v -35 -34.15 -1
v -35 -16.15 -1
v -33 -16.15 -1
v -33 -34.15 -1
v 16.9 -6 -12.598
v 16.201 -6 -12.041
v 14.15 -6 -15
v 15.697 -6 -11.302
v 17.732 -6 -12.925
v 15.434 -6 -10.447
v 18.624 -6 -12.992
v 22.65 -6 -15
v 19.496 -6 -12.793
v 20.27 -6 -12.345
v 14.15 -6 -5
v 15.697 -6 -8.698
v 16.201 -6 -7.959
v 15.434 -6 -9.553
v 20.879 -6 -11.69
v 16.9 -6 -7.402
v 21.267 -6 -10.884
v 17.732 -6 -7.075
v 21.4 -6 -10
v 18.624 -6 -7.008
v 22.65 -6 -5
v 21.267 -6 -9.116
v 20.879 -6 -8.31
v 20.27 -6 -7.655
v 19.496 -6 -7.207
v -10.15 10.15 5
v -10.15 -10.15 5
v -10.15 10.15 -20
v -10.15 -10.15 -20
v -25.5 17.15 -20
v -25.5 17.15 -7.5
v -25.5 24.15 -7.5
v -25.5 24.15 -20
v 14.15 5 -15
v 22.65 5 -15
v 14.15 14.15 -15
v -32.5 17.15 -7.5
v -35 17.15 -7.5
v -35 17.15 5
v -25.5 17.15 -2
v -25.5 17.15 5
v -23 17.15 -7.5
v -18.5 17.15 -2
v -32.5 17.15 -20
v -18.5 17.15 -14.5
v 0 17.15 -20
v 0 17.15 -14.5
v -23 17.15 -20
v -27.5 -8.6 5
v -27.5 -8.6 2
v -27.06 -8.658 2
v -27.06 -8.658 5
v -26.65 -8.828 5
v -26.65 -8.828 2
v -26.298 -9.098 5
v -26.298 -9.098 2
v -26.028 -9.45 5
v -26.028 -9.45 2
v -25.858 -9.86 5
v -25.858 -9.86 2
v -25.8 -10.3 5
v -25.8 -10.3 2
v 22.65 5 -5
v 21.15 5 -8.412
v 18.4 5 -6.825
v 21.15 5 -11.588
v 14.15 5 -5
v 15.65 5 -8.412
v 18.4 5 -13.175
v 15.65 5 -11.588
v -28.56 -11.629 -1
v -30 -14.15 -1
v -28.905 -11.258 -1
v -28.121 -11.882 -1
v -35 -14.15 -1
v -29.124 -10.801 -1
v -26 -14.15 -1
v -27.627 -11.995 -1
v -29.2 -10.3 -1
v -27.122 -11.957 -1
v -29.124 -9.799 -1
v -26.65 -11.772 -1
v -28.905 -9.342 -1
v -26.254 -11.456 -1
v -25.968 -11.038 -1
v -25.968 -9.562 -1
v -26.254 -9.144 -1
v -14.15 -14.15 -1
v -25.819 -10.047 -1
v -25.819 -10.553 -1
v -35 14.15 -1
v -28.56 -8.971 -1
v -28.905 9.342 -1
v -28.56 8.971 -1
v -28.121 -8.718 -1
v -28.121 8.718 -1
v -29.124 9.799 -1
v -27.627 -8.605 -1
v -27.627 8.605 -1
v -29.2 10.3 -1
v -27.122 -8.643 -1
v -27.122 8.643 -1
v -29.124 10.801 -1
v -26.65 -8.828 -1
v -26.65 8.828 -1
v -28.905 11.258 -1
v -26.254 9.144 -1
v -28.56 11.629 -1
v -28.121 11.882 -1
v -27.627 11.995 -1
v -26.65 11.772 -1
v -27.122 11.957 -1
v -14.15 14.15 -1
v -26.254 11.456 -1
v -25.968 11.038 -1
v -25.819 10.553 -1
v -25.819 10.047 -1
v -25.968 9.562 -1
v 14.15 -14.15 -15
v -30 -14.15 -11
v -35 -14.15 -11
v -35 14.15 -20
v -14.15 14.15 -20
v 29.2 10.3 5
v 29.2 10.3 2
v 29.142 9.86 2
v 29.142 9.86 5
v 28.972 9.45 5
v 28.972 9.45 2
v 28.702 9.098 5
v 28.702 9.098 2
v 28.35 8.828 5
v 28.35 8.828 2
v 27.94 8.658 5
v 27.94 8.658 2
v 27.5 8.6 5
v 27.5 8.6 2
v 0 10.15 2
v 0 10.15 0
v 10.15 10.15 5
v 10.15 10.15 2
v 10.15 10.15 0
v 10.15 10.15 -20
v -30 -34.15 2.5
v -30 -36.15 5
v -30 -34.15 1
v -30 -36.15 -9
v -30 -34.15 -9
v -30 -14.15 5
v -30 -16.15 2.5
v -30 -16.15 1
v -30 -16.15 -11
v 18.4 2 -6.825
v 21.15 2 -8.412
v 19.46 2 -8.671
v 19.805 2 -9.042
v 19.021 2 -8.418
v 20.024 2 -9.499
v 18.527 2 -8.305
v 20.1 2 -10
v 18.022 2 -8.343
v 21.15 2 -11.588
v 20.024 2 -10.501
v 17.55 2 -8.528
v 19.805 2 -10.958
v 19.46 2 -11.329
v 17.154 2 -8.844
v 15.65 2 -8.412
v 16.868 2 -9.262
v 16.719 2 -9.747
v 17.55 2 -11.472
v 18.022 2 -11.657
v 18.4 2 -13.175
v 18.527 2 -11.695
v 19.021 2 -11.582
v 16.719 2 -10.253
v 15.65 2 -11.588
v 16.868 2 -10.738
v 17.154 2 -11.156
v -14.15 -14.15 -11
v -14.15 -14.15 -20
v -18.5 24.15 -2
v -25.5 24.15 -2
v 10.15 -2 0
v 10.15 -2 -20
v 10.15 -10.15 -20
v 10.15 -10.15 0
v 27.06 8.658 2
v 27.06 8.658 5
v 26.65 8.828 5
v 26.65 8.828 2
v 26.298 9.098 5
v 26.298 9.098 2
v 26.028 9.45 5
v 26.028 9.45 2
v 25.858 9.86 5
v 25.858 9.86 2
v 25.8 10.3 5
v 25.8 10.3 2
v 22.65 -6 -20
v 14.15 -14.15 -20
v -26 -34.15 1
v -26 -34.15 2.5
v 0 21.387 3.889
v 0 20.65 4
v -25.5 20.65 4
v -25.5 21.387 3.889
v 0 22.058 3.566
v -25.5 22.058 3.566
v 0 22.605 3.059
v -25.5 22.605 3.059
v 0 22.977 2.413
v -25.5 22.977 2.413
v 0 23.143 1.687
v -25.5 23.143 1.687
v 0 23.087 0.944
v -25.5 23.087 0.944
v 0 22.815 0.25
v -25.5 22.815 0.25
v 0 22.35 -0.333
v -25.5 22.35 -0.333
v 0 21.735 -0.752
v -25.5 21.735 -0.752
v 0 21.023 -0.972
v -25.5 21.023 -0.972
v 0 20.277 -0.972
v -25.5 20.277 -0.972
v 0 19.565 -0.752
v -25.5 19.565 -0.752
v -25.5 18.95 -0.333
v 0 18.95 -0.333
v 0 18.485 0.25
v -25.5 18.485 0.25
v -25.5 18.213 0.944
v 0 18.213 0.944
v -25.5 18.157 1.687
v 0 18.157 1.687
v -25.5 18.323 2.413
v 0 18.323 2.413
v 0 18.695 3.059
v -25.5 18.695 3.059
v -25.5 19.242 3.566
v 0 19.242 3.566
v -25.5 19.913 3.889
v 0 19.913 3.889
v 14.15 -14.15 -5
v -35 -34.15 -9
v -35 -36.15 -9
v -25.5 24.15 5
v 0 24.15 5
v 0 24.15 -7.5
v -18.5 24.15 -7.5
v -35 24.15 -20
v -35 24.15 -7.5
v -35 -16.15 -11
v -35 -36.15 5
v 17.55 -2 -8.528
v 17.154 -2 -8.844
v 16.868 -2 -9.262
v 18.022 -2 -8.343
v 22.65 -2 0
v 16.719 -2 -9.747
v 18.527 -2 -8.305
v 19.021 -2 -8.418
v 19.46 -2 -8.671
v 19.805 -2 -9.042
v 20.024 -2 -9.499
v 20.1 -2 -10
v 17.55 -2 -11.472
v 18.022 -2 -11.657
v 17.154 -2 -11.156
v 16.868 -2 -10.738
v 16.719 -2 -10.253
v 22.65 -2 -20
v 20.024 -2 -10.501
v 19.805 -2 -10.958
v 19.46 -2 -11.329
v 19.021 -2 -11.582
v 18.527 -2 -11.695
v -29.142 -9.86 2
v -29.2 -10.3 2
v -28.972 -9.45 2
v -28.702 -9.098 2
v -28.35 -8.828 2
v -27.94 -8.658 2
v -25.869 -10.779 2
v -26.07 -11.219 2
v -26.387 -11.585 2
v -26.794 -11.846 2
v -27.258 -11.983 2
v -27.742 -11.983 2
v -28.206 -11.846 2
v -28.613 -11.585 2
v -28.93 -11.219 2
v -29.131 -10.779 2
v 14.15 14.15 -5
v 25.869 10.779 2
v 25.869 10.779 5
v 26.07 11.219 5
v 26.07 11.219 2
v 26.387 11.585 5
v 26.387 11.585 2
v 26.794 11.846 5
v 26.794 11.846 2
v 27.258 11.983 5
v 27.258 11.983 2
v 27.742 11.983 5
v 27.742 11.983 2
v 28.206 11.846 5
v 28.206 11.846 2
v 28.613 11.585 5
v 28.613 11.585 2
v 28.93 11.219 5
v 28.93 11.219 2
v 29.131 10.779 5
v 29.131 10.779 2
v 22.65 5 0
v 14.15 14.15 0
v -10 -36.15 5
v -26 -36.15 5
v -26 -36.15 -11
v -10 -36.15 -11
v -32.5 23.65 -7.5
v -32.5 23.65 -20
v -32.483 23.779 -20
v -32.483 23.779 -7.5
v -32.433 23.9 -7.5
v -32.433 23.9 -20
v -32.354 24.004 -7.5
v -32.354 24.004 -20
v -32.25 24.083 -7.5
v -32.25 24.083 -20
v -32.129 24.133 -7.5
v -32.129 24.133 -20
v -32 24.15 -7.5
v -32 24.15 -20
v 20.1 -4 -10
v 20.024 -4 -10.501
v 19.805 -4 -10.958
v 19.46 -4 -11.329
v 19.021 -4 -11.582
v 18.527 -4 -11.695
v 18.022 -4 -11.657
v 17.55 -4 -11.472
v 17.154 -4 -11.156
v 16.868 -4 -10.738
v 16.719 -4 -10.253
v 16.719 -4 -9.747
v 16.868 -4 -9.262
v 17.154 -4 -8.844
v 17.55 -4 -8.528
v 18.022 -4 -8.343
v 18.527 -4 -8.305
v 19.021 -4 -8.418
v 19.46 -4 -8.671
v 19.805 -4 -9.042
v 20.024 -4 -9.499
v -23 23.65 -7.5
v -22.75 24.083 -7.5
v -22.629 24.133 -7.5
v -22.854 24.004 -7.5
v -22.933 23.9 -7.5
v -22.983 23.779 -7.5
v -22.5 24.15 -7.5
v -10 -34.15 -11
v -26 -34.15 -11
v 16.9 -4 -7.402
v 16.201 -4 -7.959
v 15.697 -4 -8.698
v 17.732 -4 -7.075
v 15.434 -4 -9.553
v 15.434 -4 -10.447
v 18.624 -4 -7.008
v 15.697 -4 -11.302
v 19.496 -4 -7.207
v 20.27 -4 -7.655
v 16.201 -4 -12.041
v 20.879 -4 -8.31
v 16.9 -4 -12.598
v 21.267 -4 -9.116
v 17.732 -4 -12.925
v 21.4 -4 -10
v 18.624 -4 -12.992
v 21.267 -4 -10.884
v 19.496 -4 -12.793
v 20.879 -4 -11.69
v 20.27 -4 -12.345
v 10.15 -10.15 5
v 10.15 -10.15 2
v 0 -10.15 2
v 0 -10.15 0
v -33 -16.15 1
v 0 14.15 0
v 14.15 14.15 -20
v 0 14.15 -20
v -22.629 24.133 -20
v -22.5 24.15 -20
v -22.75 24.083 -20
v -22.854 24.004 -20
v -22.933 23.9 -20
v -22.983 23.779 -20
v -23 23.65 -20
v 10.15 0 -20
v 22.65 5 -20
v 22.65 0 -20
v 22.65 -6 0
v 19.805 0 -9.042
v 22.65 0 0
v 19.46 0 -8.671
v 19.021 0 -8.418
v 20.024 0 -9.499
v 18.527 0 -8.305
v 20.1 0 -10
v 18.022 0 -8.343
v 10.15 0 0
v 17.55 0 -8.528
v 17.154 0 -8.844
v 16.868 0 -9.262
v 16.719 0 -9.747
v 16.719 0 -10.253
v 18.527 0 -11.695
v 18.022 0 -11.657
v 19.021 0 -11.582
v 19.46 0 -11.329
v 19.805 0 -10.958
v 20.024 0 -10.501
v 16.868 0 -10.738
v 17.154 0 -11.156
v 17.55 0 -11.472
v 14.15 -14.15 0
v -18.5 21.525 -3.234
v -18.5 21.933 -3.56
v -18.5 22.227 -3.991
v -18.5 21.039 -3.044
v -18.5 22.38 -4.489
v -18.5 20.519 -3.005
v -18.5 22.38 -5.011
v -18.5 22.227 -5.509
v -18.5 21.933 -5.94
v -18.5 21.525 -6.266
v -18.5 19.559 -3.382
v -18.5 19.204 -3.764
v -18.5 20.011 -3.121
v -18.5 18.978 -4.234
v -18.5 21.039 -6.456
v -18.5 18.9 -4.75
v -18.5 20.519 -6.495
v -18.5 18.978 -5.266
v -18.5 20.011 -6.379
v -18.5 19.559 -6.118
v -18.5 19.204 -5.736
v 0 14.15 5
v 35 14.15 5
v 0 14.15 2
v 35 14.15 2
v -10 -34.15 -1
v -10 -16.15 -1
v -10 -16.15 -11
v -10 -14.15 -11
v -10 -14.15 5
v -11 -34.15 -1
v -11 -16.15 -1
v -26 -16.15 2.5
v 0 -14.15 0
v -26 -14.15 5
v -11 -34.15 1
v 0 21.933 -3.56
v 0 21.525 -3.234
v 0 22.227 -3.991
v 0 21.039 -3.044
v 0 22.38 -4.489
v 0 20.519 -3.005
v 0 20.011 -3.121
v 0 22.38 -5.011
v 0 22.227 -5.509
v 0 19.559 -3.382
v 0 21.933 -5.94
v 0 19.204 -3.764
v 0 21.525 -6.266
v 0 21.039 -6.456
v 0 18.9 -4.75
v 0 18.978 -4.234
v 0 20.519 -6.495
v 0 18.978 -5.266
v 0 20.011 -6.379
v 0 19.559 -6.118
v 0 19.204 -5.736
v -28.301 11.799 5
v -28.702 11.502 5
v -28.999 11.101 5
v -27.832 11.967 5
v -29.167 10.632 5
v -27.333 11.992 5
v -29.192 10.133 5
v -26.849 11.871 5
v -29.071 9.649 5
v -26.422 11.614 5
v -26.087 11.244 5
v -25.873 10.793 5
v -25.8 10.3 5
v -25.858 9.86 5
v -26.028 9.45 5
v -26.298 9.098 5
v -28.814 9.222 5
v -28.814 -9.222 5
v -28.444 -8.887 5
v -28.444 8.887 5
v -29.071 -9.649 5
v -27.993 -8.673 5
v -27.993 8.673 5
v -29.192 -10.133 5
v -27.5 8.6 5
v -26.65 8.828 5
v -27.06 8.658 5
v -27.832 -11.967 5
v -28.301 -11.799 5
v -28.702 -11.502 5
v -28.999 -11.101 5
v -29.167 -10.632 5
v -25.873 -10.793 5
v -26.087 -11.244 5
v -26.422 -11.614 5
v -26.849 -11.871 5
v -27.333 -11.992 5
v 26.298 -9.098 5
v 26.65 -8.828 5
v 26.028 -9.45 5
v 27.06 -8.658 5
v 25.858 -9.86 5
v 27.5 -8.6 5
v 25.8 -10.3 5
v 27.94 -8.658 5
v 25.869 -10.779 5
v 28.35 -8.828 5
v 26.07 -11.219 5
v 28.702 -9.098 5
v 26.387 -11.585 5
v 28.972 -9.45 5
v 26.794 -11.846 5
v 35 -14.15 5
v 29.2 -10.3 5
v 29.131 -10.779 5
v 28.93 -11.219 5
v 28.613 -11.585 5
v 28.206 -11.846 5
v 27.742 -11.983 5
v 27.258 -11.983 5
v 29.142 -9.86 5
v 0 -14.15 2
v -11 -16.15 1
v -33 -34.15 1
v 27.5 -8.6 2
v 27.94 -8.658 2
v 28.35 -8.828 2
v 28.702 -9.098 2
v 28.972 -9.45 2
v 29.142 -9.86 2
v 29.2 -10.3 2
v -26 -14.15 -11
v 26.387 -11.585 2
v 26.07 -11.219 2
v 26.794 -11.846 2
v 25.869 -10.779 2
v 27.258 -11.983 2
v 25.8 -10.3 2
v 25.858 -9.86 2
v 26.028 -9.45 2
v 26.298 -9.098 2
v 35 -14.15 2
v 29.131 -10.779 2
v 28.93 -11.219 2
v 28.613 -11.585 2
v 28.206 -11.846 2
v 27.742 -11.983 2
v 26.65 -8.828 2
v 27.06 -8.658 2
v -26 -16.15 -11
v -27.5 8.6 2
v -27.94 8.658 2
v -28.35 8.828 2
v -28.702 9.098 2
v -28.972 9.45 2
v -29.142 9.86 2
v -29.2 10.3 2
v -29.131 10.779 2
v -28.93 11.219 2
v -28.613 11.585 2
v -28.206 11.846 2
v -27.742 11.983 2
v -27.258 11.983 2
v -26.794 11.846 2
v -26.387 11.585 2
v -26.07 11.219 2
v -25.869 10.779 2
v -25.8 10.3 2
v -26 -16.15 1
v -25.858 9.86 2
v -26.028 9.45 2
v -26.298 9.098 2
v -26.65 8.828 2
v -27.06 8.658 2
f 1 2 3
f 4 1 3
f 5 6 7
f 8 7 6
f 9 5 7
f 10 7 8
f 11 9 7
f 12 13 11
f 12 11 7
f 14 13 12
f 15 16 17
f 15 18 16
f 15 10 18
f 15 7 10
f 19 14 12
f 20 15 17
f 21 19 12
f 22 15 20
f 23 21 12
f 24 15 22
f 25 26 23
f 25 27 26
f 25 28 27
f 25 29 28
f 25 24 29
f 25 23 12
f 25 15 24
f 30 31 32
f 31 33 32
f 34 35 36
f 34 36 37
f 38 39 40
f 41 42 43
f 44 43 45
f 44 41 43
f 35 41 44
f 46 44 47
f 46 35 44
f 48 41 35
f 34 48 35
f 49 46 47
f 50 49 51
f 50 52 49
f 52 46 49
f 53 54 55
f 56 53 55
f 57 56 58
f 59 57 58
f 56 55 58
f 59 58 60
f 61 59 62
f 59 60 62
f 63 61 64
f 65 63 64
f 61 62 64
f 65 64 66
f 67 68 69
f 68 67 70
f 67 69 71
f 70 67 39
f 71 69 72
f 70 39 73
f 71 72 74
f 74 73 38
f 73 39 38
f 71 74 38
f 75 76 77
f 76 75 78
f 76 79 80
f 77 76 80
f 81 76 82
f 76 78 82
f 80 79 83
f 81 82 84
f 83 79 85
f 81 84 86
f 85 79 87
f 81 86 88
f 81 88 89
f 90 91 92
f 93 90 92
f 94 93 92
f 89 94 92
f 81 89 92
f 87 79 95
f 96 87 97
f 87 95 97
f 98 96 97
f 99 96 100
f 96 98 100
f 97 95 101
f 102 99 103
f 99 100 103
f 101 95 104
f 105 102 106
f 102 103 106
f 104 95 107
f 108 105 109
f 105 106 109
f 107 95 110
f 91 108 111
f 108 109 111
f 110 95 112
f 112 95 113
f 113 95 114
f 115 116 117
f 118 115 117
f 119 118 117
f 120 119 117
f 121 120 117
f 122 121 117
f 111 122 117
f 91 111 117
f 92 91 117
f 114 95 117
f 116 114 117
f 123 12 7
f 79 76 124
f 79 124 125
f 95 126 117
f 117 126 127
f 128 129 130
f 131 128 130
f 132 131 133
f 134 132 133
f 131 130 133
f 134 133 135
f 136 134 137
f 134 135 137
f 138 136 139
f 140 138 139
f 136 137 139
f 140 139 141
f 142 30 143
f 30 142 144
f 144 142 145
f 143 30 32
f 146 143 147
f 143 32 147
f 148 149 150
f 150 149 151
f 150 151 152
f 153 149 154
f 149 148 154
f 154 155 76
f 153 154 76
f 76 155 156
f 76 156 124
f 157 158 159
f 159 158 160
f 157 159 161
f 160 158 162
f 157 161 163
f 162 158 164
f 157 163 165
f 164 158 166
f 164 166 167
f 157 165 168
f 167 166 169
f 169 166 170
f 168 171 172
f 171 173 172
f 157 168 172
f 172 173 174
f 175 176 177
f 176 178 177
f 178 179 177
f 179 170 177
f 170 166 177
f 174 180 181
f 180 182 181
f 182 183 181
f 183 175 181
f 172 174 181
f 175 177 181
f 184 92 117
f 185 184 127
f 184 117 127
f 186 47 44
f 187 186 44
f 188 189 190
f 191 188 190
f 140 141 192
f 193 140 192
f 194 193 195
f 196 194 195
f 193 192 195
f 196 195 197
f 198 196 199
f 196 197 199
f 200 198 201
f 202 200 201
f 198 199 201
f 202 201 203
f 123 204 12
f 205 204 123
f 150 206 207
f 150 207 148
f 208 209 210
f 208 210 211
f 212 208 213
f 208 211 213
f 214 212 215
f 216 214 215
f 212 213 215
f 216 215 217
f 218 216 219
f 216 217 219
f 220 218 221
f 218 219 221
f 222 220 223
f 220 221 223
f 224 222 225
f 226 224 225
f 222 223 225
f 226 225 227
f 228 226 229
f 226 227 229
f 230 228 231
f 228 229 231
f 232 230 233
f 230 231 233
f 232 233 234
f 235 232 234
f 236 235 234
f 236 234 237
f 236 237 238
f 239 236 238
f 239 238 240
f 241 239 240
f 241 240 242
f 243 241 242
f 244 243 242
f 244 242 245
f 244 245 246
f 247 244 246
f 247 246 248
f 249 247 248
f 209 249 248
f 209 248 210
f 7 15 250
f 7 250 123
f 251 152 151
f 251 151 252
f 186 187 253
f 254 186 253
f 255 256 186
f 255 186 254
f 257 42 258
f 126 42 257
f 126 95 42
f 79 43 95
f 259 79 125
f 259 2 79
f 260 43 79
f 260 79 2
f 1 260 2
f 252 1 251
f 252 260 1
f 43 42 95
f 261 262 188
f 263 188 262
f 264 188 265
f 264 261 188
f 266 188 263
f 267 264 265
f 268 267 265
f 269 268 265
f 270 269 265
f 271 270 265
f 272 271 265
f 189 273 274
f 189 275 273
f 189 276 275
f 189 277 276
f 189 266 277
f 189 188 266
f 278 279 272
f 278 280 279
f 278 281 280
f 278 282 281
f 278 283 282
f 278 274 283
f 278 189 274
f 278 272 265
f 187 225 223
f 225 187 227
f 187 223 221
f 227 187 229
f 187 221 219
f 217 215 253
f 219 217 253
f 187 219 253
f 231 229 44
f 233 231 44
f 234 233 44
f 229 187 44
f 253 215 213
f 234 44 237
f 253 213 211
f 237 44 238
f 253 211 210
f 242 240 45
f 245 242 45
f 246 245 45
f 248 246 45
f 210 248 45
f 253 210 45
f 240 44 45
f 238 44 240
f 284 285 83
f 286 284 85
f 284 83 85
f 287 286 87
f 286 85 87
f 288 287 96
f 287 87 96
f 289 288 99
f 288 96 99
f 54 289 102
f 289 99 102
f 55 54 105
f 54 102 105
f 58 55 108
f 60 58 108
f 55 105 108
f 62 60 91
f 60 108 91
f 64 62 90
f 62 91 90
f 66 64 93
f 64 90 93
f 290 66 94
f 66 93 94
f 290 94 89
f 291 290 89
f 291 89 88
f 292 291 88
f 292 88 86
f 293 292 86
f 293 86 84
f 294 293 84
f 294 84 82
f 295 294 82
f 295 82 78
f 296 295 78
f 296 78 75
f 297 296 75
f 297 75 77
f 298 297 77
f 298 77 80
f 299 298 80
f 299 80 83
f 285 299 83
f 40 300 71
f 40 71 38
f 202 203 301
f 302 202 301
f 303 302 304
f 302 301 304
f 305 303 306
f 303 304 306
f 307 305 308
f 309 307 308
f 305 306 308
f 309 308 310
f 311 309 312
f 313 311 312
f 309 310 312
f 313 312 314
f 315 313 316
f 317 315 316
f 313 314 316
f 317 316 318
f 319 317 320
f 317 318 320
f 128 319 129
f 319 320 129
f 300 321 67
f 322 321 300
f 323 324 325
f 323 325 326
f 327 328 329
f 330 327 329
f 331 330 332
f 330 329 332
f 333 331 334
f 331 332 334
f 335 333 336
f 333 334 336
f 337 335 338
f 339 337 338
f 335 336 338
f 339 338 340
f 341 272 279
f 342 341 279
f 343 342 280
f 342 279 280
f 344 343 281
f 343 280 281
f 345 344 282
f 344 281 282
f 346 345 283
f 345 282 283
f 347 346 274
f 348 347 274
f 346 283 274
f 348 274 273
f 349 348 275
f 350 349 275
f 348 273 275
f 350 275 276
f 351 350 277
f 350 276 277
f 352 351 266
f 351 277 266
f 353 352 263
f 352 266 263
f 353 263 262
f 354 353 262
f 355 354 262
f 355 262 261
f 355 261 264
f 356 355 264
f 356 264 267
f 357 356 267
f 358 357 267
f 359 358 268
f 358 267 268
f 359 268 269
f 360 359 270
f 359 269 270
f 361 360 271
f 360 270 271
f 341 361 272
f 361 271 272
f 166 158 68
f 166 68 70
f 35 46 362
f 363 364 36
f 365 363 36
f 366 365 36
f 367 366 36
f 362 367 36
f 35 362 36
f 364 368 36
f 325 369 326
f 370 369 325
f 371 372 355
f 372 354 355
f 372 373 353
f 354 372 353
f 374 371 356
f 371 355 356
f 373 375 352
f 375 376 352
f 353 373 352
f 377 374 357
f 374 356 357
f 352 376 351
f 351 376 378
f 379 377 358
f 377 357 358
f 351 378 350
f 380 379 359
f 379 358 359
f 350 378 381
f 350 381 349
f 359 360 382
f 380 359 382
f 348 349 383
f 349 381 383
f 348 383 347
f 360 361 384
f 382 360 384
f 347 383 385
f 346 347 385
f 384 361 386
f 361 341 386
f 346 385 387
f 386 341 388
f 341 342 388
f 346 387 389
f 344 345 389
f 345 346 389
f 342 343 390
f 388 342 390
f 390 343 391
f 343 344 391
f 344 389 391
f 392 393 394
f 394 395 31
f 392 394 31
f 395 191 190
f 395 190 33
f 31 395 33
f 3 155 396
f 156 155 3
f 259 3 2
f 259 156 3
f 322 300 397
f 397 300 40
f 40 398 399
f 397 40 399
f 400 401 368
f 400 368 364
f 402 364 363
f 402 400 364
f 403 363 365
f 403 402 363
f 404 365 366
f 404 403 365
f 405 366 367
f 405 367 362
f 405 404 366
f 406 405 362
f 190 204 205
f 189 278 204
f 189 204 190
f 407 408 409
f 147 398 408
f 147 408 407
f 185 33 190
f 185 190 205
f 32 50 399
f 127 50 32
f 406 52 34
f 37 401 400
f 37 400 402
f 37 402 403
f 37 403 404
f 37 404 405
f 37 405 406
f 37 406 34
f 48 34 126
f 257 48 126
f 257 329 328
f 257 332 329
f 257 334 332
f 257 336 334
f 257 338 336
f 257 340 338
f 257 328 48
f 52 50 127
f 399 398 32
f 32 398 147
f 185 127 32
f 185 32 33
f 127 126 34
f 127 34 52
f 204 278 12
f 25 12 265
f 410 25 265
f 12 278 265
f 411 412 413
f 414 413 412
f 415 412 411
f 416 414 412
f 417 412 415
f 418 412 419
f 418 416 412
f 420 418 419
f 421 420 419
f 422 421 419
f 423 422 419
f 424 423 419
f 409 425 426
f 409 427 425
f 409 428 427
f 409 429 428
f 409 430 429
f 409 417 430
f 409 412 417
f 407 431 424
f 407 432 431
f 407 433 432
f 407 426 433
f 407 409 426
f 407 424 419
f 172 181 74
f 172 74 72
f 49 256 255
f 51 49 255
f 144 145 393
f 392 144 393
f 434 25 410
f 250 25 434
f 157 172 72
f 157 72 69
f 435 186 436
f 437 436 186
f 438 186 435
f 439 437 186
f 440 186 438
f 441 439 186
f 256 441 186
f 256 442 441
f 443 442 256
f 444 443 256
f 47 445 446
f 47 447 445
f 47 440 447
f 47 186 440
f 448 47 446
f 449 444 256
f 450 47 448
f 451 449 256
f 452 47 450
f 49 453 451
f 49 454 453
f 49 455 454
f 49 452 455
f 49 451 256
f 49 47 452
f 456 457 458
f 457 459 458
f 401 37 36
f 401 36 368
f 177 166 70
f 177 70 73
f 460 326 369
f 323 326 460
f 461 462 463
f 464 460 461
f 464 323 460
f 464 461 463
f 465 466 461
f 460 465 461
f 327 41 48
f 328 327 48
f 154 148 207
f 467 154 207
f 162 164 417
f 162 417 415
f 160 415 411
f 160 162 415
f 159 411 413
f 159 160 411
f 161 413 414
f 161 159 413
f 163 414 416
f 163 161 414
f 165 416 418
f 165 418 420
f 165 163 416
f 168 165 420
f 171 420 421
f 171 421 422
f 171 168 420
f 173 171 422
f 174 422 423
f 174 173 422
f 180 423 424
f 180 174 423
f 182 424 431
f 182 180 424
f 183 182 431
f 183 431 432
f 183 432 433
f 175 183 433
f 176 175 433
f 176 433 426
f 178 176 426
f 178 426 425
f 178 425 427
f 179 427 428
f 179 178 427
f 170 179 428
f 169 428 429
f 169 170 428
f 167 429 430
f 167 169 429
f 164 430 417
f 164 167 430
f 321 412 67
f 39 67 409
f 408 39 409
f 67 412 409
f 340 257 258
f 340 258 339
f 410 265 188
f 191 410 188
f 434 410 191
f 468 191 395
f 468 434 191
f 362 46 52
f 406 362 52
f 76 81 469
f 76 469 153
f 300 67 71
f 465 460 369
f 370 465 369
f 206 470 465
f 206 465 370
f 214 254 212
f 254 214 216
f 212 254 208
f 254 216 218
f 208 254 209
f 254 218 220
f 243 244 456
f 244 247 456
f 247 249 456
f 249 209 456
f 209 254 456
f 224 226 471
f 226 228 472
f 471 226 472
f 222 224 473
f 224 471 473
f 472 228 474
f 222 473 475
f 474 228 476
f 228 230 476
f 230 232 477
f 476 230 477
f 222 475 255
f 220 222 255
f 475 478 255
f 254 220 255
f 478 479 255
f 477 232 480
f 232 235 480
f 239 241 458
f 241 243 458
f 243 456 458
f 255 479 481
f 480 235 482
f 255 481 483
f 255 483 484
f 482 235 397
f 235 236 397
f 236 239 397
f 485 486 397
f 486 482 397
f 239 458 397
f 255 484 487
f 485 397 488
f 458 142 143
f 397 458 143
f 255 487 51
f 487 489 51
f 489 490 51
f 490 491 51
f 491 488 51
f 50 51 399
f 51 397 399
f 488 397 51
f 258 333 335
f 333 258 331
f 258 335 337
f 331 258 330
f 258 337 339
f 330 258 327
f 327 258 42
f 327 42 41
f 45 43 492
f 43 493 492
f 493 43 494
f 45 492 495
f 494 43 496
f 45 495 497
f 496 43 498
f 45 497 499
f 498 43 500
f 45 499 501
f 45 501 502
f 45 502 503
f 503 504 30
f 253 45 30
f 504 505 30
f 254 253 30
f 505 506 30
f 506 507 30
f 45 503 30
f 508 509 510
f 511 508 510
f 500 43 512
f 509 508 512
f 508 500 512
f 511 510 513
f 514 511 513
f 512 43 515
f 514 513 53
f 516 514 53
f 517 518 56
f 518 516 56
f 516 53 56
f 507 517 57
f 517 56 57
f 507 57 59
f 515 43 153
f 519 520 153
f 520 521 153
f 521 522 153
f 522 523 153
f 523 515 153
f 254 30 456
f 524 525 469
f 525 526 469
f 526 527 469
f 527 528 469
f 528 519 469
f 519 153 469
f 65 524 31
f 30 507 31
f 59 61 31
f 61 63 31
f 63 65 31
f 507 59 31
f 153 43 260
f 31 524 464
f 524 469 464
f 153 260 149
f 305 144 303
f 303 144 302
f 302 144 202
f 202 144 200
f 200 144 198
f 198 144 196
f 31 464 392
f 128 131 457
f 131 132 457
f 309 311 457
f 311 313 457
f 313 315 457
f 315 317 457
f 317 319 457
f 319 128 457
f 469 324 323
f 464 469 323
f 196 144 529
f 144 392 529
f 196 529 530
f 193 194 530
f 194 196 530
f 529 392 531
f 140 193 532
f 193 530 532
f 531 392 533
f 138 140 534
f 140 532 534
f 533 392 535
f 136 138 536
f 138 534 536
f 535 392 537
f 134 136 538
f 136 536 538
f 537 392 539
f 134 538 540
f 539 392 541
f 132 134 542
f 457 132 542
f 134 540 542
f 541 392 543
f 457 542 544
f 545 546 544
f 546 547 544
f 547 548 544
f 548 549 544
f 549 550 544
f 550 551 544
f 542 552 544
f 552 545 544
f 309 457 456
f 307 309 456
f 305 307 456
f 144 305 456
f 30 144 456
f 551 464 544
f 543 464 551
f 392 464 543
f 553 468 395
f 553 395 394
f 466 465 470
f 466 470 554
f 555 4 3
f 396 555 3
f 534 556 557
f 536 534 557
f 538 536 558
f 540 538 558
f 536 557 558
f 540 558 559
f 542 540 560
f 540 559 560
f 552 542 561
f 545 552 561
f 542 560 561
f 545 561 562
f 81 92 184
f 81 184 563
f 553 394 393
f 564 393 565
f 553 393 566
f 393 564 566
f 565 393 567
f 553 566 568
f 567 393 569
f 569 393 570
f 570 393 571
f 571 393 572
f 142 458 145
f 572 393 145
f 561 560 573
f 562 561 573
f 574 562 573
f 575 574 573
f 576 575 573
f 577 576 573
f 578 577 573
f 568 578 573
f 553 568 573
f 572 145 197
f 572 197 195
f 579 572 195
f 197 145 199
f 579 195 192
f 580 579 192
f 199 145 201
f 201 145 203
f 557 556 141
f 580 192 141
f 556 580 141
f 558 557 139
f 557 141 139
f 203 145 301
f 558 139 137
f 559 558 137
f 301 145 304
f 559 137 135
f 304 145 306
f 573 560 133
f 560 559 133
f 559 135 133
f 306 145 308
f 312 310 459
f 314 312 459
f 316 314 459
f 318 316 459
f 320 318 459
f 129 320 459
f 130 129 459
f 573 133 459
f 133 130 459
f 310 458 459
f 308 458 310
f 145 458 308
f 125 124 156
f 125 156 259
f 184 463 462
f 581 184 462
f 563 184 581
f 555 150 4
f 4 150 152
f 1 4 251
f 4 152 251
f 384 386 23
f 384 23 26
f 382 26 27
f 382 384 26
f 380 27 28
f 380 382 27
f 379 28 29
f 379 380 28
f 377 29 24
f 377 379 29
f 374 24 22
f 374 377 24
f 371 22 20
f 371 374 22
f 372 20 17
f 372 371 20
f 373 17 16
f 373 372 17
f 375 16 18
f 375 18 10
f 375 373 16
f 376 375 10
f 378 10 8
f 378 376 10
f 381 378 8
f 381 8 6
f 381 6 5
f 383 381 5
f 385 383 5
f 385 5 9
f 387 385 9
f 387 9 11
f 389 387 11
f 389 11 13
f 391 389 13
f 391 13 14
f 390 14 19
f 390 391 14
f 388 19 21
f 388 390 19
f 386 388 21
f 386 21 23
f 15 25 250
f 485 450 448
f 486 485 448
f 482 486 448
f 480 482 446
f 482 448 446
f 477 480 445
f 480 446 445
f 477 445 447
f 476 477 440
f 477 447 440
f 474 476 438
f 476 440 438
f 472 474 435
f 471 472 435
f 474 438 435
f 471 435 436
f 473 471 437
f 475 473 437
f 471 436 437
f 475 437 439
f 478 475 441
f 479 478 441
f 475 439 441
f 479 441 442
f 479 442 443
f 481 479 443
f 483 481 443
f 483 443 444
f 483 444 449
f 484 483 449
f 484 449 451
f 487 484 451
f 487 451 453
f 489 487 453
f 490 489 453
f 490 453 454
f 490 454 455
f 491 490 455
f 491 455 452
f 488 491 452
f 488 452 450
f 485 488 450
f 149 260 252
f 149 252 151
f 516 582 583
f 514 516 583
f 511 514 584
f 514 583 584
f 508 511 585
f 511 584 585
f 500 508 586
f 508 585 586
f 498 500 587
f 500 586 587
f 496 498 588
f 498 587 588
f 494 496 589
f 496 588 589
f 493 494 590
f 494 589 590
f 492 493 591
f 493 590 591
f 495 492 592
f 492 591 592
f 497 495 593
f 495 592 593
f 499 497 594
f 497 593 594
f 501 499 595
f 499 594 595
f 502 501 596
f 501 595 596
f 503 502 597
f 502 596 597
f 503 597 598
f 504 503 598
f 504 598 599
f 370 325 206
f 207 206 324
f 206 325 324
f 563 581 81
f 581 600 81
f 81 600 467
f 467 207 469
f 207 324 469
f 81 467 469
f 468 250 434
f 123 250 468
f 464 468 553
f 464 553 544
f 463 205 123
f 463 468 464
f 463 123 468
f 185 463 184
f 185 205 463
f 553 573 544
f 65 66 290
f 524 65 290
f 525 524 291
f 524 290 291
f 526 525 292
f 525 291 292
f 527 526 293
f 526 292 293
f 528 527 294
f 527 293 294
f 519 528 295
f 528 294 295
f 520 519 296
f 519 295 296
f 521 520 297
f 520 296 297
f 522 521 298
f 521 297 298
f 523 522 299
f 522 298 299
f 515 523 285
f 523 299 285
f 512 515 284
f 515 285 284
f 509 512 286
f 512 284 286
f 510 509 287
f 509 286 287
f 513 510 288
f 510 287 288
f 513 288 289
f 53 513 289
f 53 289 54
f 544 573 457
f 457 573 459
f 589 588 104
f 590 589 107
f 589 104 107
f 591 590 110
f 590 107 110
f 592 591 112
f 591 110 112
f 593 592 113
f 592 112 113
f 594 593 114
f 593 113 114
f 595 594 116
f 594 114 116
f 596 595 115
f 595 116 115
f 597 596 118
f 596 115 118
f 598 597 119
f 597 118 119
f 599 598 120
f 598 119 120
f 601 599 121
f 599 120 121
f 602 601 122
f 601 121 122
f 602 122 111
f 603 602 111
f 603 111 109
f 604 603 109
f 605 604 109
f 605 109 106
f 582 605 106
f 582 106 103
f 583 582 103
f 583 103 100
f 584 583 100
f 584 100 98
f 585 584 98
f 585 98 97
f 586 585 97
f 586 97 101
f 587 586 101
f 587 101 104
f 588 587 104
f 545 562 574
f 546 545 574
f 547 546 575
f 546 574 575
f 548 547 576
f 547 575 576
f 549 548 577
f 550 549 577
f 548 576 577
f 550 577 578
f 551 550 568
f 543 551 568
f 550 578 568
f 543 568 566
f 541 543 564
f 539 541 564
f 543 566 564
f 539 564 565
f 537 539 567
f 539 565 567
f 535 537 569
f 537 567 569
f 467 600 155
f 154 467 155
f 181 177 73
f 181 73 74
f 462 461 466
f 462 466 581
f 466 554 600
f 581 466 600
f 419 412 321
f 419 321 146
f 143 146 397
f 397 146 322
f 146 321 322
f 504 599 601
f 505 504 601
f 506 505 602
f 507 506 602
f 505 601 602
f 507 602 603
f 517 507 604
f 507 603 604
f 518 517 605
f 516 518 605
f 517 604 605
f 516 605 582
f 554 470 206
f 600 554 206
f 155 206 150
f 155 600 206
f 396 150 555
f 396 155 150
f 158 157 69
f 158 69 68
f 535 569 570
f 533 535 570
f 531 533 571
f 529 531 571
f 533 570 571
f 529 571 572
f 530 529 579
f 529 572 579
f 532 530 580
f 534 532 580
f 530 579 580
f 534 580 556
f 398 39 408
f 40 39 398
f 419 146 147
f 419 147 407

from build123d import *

# Parameters (mm, degrees)
ESQUISSE1_W                = 28.3
ESQUISSE1_H                = 28.3
ESQUISSE1_W_2              = 20.3
ESQUISSE1_H_2              = 20.3
BOSS_EXTRU_1_DEPTH         = 20
BOSS_EXTRU_7_DEPTH         = 20
ESQUISSE2_W                = 8.5
ESQUISSE2_H                = 20
ESQUISSE2_R                = 1.7
BOSS_EXTRU_2_DEPTH         = 2
ESQUISSE2_3_W              = 8.5
ESQUISSE2_3_H              = 20
BOSS_EXTRU_3_DEPTH         = 3
ESQUISSE3_W                = 8.5
ESQUISSE3_H                = 20
ESQUISSE3_R                = 1.7
BOSS_EXTRU_4_DEPTH         = 2
ESQUISSE5_W                = 8.5
ESQUISSE5_H                = 20
ESQUISSE5_R                = 3
BOSS_EXTRU_5_DEPTH         = 2
BOSS_EXTRU_6_DEPTH         = 20
BOSS_EXTRU_6_DEPTH_BACK    = 20
ESQUISSE6_W                = 28.3
ESQUISSE6_H                = 28.3
ESQUISSE6_W_2              = 15.3
ESQUISSE6_H_2              = 15.3
ENL_V_MAT_EXTRU_1_REACH    = 68.678
ESQUISSE7_W                = 6.5
ESQUISSE7_H                = 2
ENL_V_MAT_EXTRU_2_REACH    = 65.341
ESQUISSE8_W                = 14.15
ESQUISSE8_H                = 2
ESQUISSE9_W                = 8.5
ESQUISSE9_H                = 40
BOSS_EXTRU_8_DEPTH         = 5
ESQUISSE9_4_R              = 1.7
BOSS_EXTRU_9_DEPTH         = 2
BOSS_EXTRU_10_START        = -2
ESQUISSE10_W               = 8.5
ESQUISSE10_H               = 40
ESQUISSE10_R               = 1.7
BOSS_EXTRU_10_DEPTH        = 2
ESQUISSE11_W               = 8.5
ESQUISSE11_H               = 40
ESQUISSE11_R               = 3
BOSS_EXTRU_11_DEPTH        = 2
NERVURE4_REACH             = 68.678
ESQUISSE14_WALL_W          = 147.131281186
ESQUISSE14_WALL_H          = 5
NERVURE10_REACH            = 68.678
ESQUISSE16_WALL_W          = 147.844247416
ESQUISSE16_WALL_H          = 5
R_P_TITION_LIN_AIRE1_COUNT = 3
R_P_TITION_LIN_AIRE1_PITCH = 17.5
NERVURE11_REACH            = 76.685
ESQUISSE17_WALL_W          = 163.85974229
ESQUISSE17_WALL_H          = 5
NERVURE17_REACH            = 58.973
ESQUISSE19_WALL_W          = 127.721749296
ESQUISSE19_WALL_H          = 5
R_P_TITION_LIN_AIRE2_COUNT = 2
R_P_TITION_LIN_AIRE2_PITCH = 15
R_P_TITION_LIN_AIRE3_COUNT = 2
R_P_TITION_LIN_AIRE3_PITCH = 15
ENL_V_MAT_EXTRU_3_REACH    = 57.288
ESQUISSE20_W               = 77.833771897
ESQUISSE20_H               = 63.25162408
ESQUISSE21_W               = 14.15
ESQUISSE21_H               = 3.85
BOSS_EXTRU_12_DEPTH        = 3
BOSS_EXTRU_13_START        = 3
ESQUISSE23_W               = 20.85
ESQUISSE23_H               = 28.3
ESQUISSE23_R               = 1.7
BOSS_EXTRU_13_DEPTH        = 3
ESQUISSE24_W               = 25
ESQUISSE24_H               = 22
BOSS_EXTRU_14_DEPTH        = 6
ESQUISSE25_W               = 22
ESQUISSE25_H               = 18
ENL_V_MAT_EXTRU_4_DEPTH    = 2
ENL_V_MAT_EXTRU_5_REACH    = 55.785
ESQUISSE26_W               = 4
ESQUISSE26_H               = 2
ENL_V_MAT_EXTRU_6_REACH    = 64.912
ESQUISSE27_W               = 4
ESQUISSE27_H               = 2.5
ESQUISSE28_W               = 16
ESQUISSE28_H               = 2
ESQUISSE28_W_2             = 5
BOSS_EXTRU_15_DEPTH        = 10
ESQUISSE29_W               = 5
ESQUISSE29_H               = 2
ENL_V_MAT_EXTRU_7_DEPTH    = 2
ESQUISSE30_W               = 35
ESQUISSE30_H               = 25
BOSS_EXTRU_16_DEPTH        = 3
ESQUISSE31_W               = 2.5
ESQUISSE31_H               = 12.5
ESQUISSE31_W_2             = 18.5
ESQUISSE31_H_2             = 5.5
BOSS_EXTRU_17_DEPTH        = 7
ESQUISSE32_R               = 1.75
ESQUISSE32_R_2             = 2.5
ENL_V_MAT_EXTRU_8_DEPTH    = 74.260306442
CHANFREIN1_SIZE            = 7
BOSS_EXTRU_18_DEPTH        = 12.5


with BuildPart() as part:
    # Esquisse1 → Boss.-Extru.1 (new body)
    with BuildSketch(Plane.XY):
        Rectangle(ESQUISSE1_W, ESQUISSE1_H)
        Rectangle(ESQUISSE1_W_2, ESQUISSE1_H_2, mode=Mode.SUBTRACT)
    extrude(amount=BOSS_EXTRU_1_DEPTH)

    # Esquisse1<3> → Boss.-Extru.7 (add)
    with BuildSketch(Plane.XY):
        Polygon((14.15, 14.15), (-14.15, 14.15), (-14.15, -14.15), (14.15, -14.15), (14.15, -2), (10.15, -2), (10.15, -10.15), (-10.15, -10.15), (-10.15, 10.15), (10.15, 10.15), (10.15, 0), (14.15, 0), align=None)
    extrude(amount=-BOSS_EXTRU_7_DEPTH)

    # Esquisse2 → Boss.-Extru.2 (add)
    with BuildSketch(Plane(origin=(0, 2, 0), x_dir=(-1, 0, 0), z_dir=(0, -1, 0))):
        with Locations((-18.4, 10)):
            Rectangle(ESQUISSE2_W, ESQUISSE2_H)
        with Locations(Location((-18.4, 10, 0), (0, 0, 180))):
            Circle(ESQUISSE2_R, mode=Mode.SUBTRACT)
    extrude(amount=BOSS_EXTRU_2_DEPTH)

    # Esquisse2<3> → Boss.-Extru.3 (add)
    with BuildSketch(Plane(origin=(0, 2, 0), x_dir=(-1, 0, 0), z_dir=(0, -1, 0))):
        with Locations((-18.4, 10)):
            Rectangle(ESQUISSE2_3_W, ESQUISSE2_3_H)
        Polygon((-15.65, 11.58771324), (-15.65, 8.41228676), (-18.4, 6.824573519), (-21.15, 8.41228676), (-21.15, 11.58771324), (-18.4, 13.175426481), align=None, mode=Mode.SUBTRACT)
    extrude(amount=-BOSS_EXTRU_3_DEPTH)

    # Esquisse3 → Boss.-Extru.4 (add)
    with BuildSketch(Plane(origin=(0, -2, 0), x_dir=(1, 0, 0), z_dir=(0, 1, 0))):
        with Locations((18.4, 10)):
            Rectangle(ESQUISSE3_W, ESQUISSE3_H)
        with Locations((18.4, 10)):
            Circle(ESQUISSE3_R, mode=Mode.SUBTRACT)
    extrude(amount=-BOSS_EXTRU_4_DEPTH)

    # Esquisse5 → Boss.-Extru.5 (add)
    with BuildSketch(Plane.XZ.offset(4)):
        with Locations((18.4, -10)):
            Rectangle(ESQUISSE5_W, ESQUISSE5_H)
        with Locations((18.4, -10)):
            Circle(ESQUISSE5_R, mode=Mode.SUBTRACT)
    extrude(amount=BOSS_EXTRU_5_DEPTH)

    # Esquisse6 → Boss.-Extru.6 (add, two sides: drawn at the far end of the back side and taken through both)
    with BuildSketch(Plane(origin=(0, 0, 0), x_dir=(-1, 0, 0), z_dir=(0, -1, 0)).offset(-BOSS_EXTRU_6_DEPTH_BACK)):
        with Locations((0, -34.15)):
            Rectangle(ESQUISSE6_W, ESQUISSE6_H)
        with Locations((0, -34.15)):
            Rectangle(ESQUISSE6_W_2, ESQUISSE6_H_2, mode=Mode.SUBTRACT)
    extrude(amount=BOSS_EXTRU_6_DEPTH + BOSS_EXTRU_6_DEPTH_BACK)

    # Esquisse7 → Enlèv. mat.-Extru.1 (cut, up to next)
    with BuildSketch(Plane.XZ.offset(20), mode=Mode.PRIVATE) as enl_v_mat_extru_1_sk1:
        with Locations((10.9, 35.15)):
            Rectangle(ESQUISSE7_W, ESQUISSE7_H)
    enl_v_mat_extru_1_tool1 = extrude(enl_v_mat_extru_1_sk1.sketch, amount=-ENL_V_MAT_EXTRU_1_REACH, mode=Mode.PRIVATE) & part.part
    add(enl_v_mat_extru_1_tool1.solids().sort_by_distance((10.9, -20, 35.15))[0], mode=Mode.SUBTRACT)

    # Esquisse8 → Enlèv. mat.-Extru.2 (cut, up to next)
    with BuildSketch(Plane.XZ.offset(14.15), mode=Mode.PRIVATE) as enl_v_mat_extru_2_sk1:
        with Locations((7.075, 1)):
            Rectangle(ESQUISSE8_W, ESQUISSE8_H)
    enl_v_mat_extru_2_tool1 = extrude(enl_v_mat_extru_2_sk1.sketch, amount=-ENL_V_MAT_EXTRU_2_REACH, mode=Mode.PRIVATE) & part.part
    add(enl_v_mat_extru_2_tool1.solids().sort_by_distance((7.075, -14.15, 1))[0], mode=Mode.SUBTRACT)

    # Esquisse9 → Boss.-Extru.8 (add)
    with BuildSketch(Plane.XY.offset(34.15)):
        with Locations((18.4, 0)):
            Rectangle(ESQUISSE9_W, ESQUISSE9_H)
        Polygon((18.4, 6.824573519), (21.15, 8.41228676), (21.15, 11.58771324), (18.4, 13.175426481), (15.65, 11.58771324), (15.65, 8.41228676), align=None, mode=Mode.SUBTRACT)
        Polygon((18.4, -6.824573519), (21.15, -8.41228676), (21.15, -11.58771324), (18.4, -13.175426481), (15.65, -11.58771324), (15.65, -8.41228676), align=None, mode=Mode.SUBTRACT)
    extrude(amount=-BOSS_EXTRU_8_DEPTH)

    # Esquisse9<4> → Boss.-Extru.9 (add)
    # profile 1 of 2: a face of its own
    with BuildSketch(Plane.XY.offset(34.15)):
        Polygon((15.65, 8.41228676), (18.4, 6.824573519), (21.15, 8.41228676), (21.15, 11.58771324), (18.4, 13.175426481), (15.65, 11.58771324), align=None)
        with Locations((18.4, 10)):
            Circle(ESQUISSE9_4_R, mode=Mode.SUBTRACT)
    # profile 2 of 2: a face of its own
    with BuildSketch(Plane.XY.offset(34.15)):
        Polygon((21.15, -8.41228676), (21.15, -11.58771324), (18.4, -13.175426481), (15.65, -11.58771324), (15.65, -8.41228676), (18.4, -6.824573519), align=None)
        with Locations((18.4, -10)):
            Circle(ESQUISSE9_4_R, mode=Mode.SUBTRACT)
    extrude(amount=-BOSS_EXTRU_9_DEPTH)

    # Esquisse10 → Boss.-Extru.10 (add)
    with BuildSketch(Plane(origin=(0, 0, 36.15), x_dir=(-1, 0, 0), z_dir=(0, 0, -1)).offset(BOSS_EXTRU_10_START)):
        with Locations((-18.4, 0)):
            Rectangle(ESQUISSE10_W, ESQUISSE10_H)
        with Locations(Location((-18.4, -10, 0), (0, 0, 180))):
            Circle(ESQUISSE10_R, mode=Mode.SUBTRACT)
        with Locations(Location((-18.4, 10, 0), (0, 0, 180))):
            Circle(ESQUISSE10_R, mode=Mode.SUBTRACT)
    extrude(amount=BOSS_EXTRU_10_DEPTH)

    # Esquisse11 → Boss.-Extru.11 (add)
    with BuildSketch(Plane.XY.offset(38.15)):
        with Locations((18.4, 0)):
            Rectangle(ESQUISSE11_W, ESQUISSE11_H)
        with Locations((18.4, 10)):
            Circle(ESQUISSE11_R, mode=Mode.SUBTRACT)
        with Locations((18.4, -10)):
            Circle(ESQUISSE11_R, mode=Mode.SUBTRACT)
    extrude(amount=BOSS_EXTRU_11_DEPTH)

    # Esquisse14 wall → Nervure4 (add, up to next)
    with BuildSketch(Plane(origin=(18.4, -20, 44.225), x_dir=(0.721811427095, 0, -0.692089780097), z_dir=(0.692089780097, 0, 0.721811427095)), mode=Mode.PRIVATE) as nervure4_sk1:
        with Locations((0, 2.5)):
            Rectangle(ESQUISSE14_WALL_W, ESQUISSE14_WALL_H)
    nervure4_tool1 = extrude(nervure4_sk1.sketch, amount=-NERVURE4_REACH, mode=Mode.PRIVATE) - part.part
    nervure4 = nervure4_tool1.solids().sort_by_distance((18.4, -20, 44.225))[0]
    add(nervure4)

    # Esquisse16 wall → Nervure10 (add, up to next)
    with BuildSketch(Plane(origin=(18.4, -20, 24.575), x_dir=(-0.680604645507, 0, -0.732650883105), z_dir=(0.732650883105, 0, -0.680604645507)), mode=Mode.PRIVATE) as nervure10_sk1:
        with Locations((0, 2.5)):
            Rectangle(ESQUISSE16_WALL_W, ESQUISSE16_WALL_H)
    nervure10_tool1 = extrude(nervure10_sk1.sketch, amount=-NERVURE10_REACH, mode=Mode.PRIVATE) - part.part
    nervure10 = nervure10_tool1.solids().sort_by_distance((18.4, -20, 24.575))[0]
    add(nervure10)

    # Répétition linéaire1: Nervure4, Nervure10 ×3
    with Locations(*[(0, i * R_P_TITION_LIN_AIRE1_PITCH, 0) for i in range(1, R_P_TITION_LIN_AIRE1_COUNT)]):
        add(nervure4)
        add(nervure10)

    # Esquisse17 wall → Nervure11 (add, up to next)
    with BuildSketch(Plane(origin=(18.4, 9.575, -20), x_dir=(-0.680604645507, 0.732650883105, 0), z_dir=(0.732650883105, 0.680604645507, 0)), mode=Mode.PRIVATE) as nervure11_sk1:
        with Locations((0, 2.5)):
            Rectangle(ESQUISSE17_WALL_W, ESQUISSE17_WALL_H)
    nervure11_tool1 = extrude(nervure11_sk1.sketch, amount=-NERVURE11_REACH, mode=Mode.PRIVATE) - part.part
    nervure11 = nervure11_tool1.solids().sort_by_distance((18.4, 9.575, -20))[0]
    add(nervure11)

    # Esquisse19 wall → Nervure17 (add, up to next)
    with BuildSketch(Plane(origin=(18.4, -10.075, 0), x_dir=(-0.721811427095, -0.692089780097, 0), z_dir=(0.692089780097, -0.721811427095, 0)), mode=Mode.PRIVATE) as nervure17_sk1:
        with Locations((0, 2.5)):
            Rectangle(ESQUISSE19_WALL_W, ESQUISSE19_WALL_H)
    nervure17_tool1 = extrude(nervure17_sk1.sketch, amount=-NERVURE17_REACH, mode=Mode.PRIVATE) - part.part
    nervure17 = nervure17_tool1.solids().sort_by_distance((18.4, -10.075, 0))[0]
    add(nervure17)

    # Répétition linéaire2: Nervure17 ×2
    with Locations(*[(0, 0, -i * R_P_TITION_LIN_AIRE2_PITCH) for i in range(1, R_P_TITION_LIN_AIRE2_COUNT)]):
        add(nervure17)

    # Répétition linéaire3: Nervure11 ×2
    with Locations(*[(0, 0, i * R_P_TITION_LIN_AIRE3_PITCH) for i in range(1, R_P_TITION_LIN_AIRE3_COUNT)]):
        add(nervure11)

    # Esquisse20 → Enlèv. mat.-Extru.3 (cut, up to next)
    with BuildSketch(Plane(origin=(0, 0, 2), x_dir=(-1, 0, 0), z_dir=(0, 0, -1)), mode=Mode.PRIVATE) as enl_v_mat_extru_3_sk1:
        with Locations((6.593135557, -7.228757038)):
            Rectangle(ESQUISSE20_W, ESQUISSE20_H)
    enl_v_mat_extru_3_tool1 = extrude(enl_v_mat_extru_3_sk1.sketch, amount=-ENL_V_MAT_EXTRU_3_REACH, mode=Mode.PRIVATE) & part.part
    add(enl_v_mat_extru_3_tool1.solids().sort_by_distance((-6.593136, -7.228757, 2))[0], mode=Mode.SUBTRACT)

    # Esquisse21 → Boss.-Extru.12 (add)
    with BuildSketch(Plane.XY.offset(2)):
        with BuildLine():
            ThreePointArc((-27.5, 8.6), (-28.702081528, 11.502081528), (-25.8, 10.3))
            Line((-25.8, 10.3), (-14.15, 10.3))
            Line((-14.15, 10.3), (-14.15, 14.15))
            Line((-14.15, 14.15), (-35, 14.15))
            Line((-35, 14.15), (-35, -14.15))
            Line((-35, -14.15), (-14.15, -14.15))
            Line((-14.15, -14.15), (-14.15, -10.3))
            Line((-14.15, -10.3), (-25.8, -10.3))
            ThreePointArc((-25.8, -10.3), (-28.702081528, -11.502081528), (-27.5, -8.6))
            Line((-27.5, -8.6), (-27.5, 8.6))
        make_face()
        with BuildLine():
            Line((-14.15, 10.3), (-25.8, 10.3))
            ThreePointArc((-25.8, 10.3), (-26.297918472, 9.097918472), (-27.5, 8.6))
            Line((-27.5, 8.6), (-27.5, -8.6))
            ThreePointArc((-27.5, -8.6), (-26.297918472, -9.097918472), (-25.8, -10.3))
            Line((-25.8, -10.3), (-14.15, -10.3))
            Line((-14.15, -10.3), (-14.15, 10.3))
        make_face()
        with BuildLine():
            Line((0, 14.15), (0, 10.3))
            Line((0, 10.3), (25.8, 10.3))
            ThreePointArc((25.8, 10.3), (27.5, 12), (29.2, 10.3))
            ThreePointArc((29.2, 10.3), (28.702081528, 9.097918472), (27.5, 8.6))
            Line((27.5, 8.6), (27.5, -8.6))
            ThreePointArc((27.5, -8.6), (28.702081528, -9.097918472), (29.2, -10.3))
            ThreePointArc((29.2, -10.3), (27.5, -12), (25.8, -10.3))
            Line((25.8, -10.3), (0, -10.3))
            Line((0, -10.3), (0, -14.15))
            Line((0, -14.15), (35, -14.15))
            Line((35, -14.15), (35, 14.15))
            Line((35, 14.15), (0, 14.15))
        make_face()
        with Locations((-7.075, 12.225)):
            Rectangle(ESQUISSE21_W, ESQUISSE21_H)
        Polygon((0, 10.3), (-14.15, 10.3), (-14.15, -10.3), (0, -10.3), (0, -10.15), (-10.15, -10.15), (-10.15, 10.15), (0, 10.15), align=None)
        with Locations((-7.075, -12.225)):
            Rectangle(ESQUISSE21_W, ESQUISSE21_H)
        with BuildLine():
            Line((25.8, 10.3), (0, 10.3))
            Line((0, 10.3), (0, 10.15))
            Line((0, 10.15), (10.15, 10.15))
            Line((10.15, 10.15), (10.15, -10.15))
            Line((10.15, -10.15), (0, -10.15))
            Line((0, -10.15), (0, -10.3))
            Line((0, -10.3), (25.8, -10.3))
            ThreePointArc((25.8, -10.3), (26.297918472, -9.097918472), (27.5, -8.6))
            Line((27.5, -8.6), (27.5, 8.6))
            ThreePointArc((27.5, 8.6), (26.297918472, 9.097918472), (25.8, 10.3))
        make_face()
    extrude(amount=BOSS_EXTRU_12_DEPTH)

    # Esquisse23 → Boss.-Extru.13 (add)
    with BuildSketch(Plane(origin=(0, 0, 2), x_dir=(-1, 0, 0), z_dir=(0, 0, -1)).offset(BOSS_EXTRU_13_START)):
        with Locations((24.575, 0)):
            Rectangle(ESQUISSE23_W, ESQUISSE23_H)
        with Locations((27.5, 10.3)):
            Circle(ESQUISSE23_R, mode=Mode.SUBTRACT)
        with Locations((27.5, -10.3)):
            Circle(ESQUISSE23_R, mode=Mode.SUBTRACT)
    extrude(amount=-BOSS_EXTRU_13_DEPTH)

    # Esquisse24 → Boss.-Extru.14 (add)
    with BuildSketch(Plane.XY.offset(5)):
        with Locations((-22.5, -25.15)):
            Rectangle(ESQUISSE24_W, ESQUISSE24_H)
    extrude(amount=-BOSS_EXTRU_14_DEPTH)

    # Esquisse25 → Enlèv. mat.-Extru.4 (cut)
    with BuildSketch(Plane(origin=(0, 0, -1), x_dir=(-1, 0, 0), z_dir=(0, 0, -1))):
        with Locations((22, -25.15)):
            Rectangle(ESQUISSE25_W, ESQUISSE25_H)
    extrude(amount=-ENL_V_MAT_EXTRU_4_DEPTH, mode=Mode.SUBTRACT)

    # Esquisse26 → Enlèv. mat.-Extru.5 (cut, up to next)
    with BuildSketch(Plane(origin=(0, 0, -1), x_dir=(-1, 0, 0), z_dir=(0, 0, -1)), mode=Mode.PRIVATE) as enl_v_mat_extru_5_sk1:
        with Locations((28, -15.15)):
            Rectangle(ESQUISSE26_W, ESQUISSE26_H)
    enl_v_mat_extru_5_tool1 = extrude(enl_v_mat_extru_5_sk1.sketch, amount=-ENL_V_MAT_EXTRU_5_REACH, mode=Mode.PRIVATE) & part.part
    # Esquisse26 → Enlèv. mat.-Extru.5 (cut, up to next)
    with BuildSketch(Plane(origin=(0, 0, -1), x_dir=(-1, 0, 0), z_dir=(0, 0, -1)), mode=Mode.PRIVATE) as enl_v_mat_extru_5_sk2:
        with Locations((28, -35.15)):
            Rectangle(ESQUISSE26_W, ESQUISSE26_H)
    enl_v_mat_extru_5_tool2 = extrude(enl_v_mat_extru_5_sk2.sketch, amount=-ENL_V_MAT_EXTRU_5_REACH, mode=Mode.PRIVATE) & part.part
    add(enl_v_mat_extru_5_tool1.solids().sort_by_distance((-28, -15.15, -1))[0], mode=Mode.SUBTRACT)
    add(enl_v_mat_extru_5_tool2.solids().sort_by_distance((-28, -35.15, -1))[0], mode=Mode.SUBTRACT)

    # Esquisse27 → Enlèv. mat.-Extru.6 (cut, up to next)
    with BuildSketch(Plane.XZ.offset(34.15), mode=Mode.PRIVATE) as enl_v_mat_extru_6_sk1:
        with Locations((-28, 3.75)):
            Rectangle(ESQUISSE27_W, ESQUISSE27_H)
    enl_v_mat_extru_6_tool1 = extrude(enl_v_mat_extru_6_sk1.sketch, amount=-ENL_V_MAT_EXTRU_6_REACH, mode=Mode.PRIVATE) & part.part
    add(enl_v_mat_extru_6_tool1.solids().sort_by_distance((-28, -34.15, 3.75))[0], mode=Mode.SUBTRACT)

    # Esquisse28 → Boss.-Extru.15 (add)
    with BuildSketch(Plane(origin=(0, 0, -1), x_dir=(-1, 0, 0), z_dir=(0, 0, -1))):
        with Locations((18, -15.15)):
            Rectangle(ESQUISSE28_W, ESQUISSE28_H)
        with Locations((32.5, -15.15)):
            Rectangle(ESQUISSE28_W_2, ESQUISSE28_H)
        with Locations((32.5, -35.15)):
            Rectangle(ESQUISSE28_W_2, ESQUISSE28_H)
        with Locations((18, -35.15)):
            Rectangle(ESQUISSE28_W, ESQUISSE28_H)
    extrude(amount=BOSS_EXTRU_15_DEPTH)

    # Esquisse29 → Enlèv. mat.-Extru.7 (cut)
    with BuildSketch(Plane(origin=(0, 0, -11), x_dir=(-1, 0, 0), z_dir=(0, 0, -1))):
        with Locations((32.5, -35.15)):
            Rectangle(ESQUISSE29_W, ESQUISSE29_H)
    extrude(amount=-ENL_V_MAT_EXTRU_7_DEPTH, mode=Mode.SUBTRACT)

    # Esquisse30 → Boss.-Extru.16 (add)
    with BuildSketch(Plane(origin=(0, 14.15, 0), x_dir=(1, 0, 0), z_dir=(0, 1, 0))):
        with Locations((-17.5, 7.5)):
            Rectangle(ESQUISSE30_W, ESQUISSE30_H)
    extrude(amount=BOSS_EXTRU_16_DEPTH)

    # Esquisse31 → Boss.-Extru.17 (add)
    with BuildSketch(Plane(origin=(0, 17.15, 0), x_dir=(1, 0, 0), z_dir=(0, 1, 0))):
        with Locations((-33.75, 13.75)):
            Rectangle(ESQUISSE31_W, ESQUISSE31_H)
        with Locations((-24.25, 13.75)):
            Rectangle(ESQUISSE31_W, ESQUISSE31_H)
        with Locations((-9.25, 4.75)):
            Rectangle(ESQUISSE31_W_2, ESQUISSE31_H_2)
        Polygon((-25.5, 2), (-25.5, -5), (0, -5), (0, 2), (-18.5, 2), align=None)
    extrude(amount=BOSS_EXTRU_17_DEPTH)

    # Esquisse32 → Enlèv. mat.-Extru.8 (cut, through all)
    with BuildSketch(Plane.ZY.offset(25.5)):
        with Locations(Location((-4.75, 20.65, 0), (0, 0, 270))):
            Circle(ESQUISSE32_R)
        with Locations((1.5, 20.65)):
            Circle(ESQUISSE32_R_2)
    extrude(amount=-ENL_V_MAT_EXTRU_8_DEPTH, mode=Mode.SUBTRACT)

    # Chanfrein1
    chanfrein1_edges = [part.edges().sort_by_distance(p)[0] for p in [
        (-9.25, 17.15, -7.5),
    ]]
    chamfer(chanfrein1_edges, length=CHANFREIN1_SIZE - 0.0001)  # a hair under: the kernel refuses the full size

    # Esquisse34 → Boss.-Extru.18 (add)
    with BuildSketch(Plane(origin=(0, 0, -20), x_dir=(-1, 0, 0), z_dir=(0, 0, -1))):
        with BuildLine():
            Line((23, 24.15), (22.5, 24.15))
            ThreePointArc((22.5, 24.15), (22.853553391, 24.003553391), (23, 23.65))
            Line((23, 23.65), (23, 24.15))
        make_face()
        with BuildLine():
            Line((32.5, 24.15), (32.5, 23.65))
            ThreePointArc((32.5, 23.65), (32.353553391, 24.003553391), (32, 24.15))
            Line((32, 24.15), (32.5, 24.15))
        make_face()
    extrude(amount=-BOSS_EXTRU_18_DEPTH)


solid = part.part
